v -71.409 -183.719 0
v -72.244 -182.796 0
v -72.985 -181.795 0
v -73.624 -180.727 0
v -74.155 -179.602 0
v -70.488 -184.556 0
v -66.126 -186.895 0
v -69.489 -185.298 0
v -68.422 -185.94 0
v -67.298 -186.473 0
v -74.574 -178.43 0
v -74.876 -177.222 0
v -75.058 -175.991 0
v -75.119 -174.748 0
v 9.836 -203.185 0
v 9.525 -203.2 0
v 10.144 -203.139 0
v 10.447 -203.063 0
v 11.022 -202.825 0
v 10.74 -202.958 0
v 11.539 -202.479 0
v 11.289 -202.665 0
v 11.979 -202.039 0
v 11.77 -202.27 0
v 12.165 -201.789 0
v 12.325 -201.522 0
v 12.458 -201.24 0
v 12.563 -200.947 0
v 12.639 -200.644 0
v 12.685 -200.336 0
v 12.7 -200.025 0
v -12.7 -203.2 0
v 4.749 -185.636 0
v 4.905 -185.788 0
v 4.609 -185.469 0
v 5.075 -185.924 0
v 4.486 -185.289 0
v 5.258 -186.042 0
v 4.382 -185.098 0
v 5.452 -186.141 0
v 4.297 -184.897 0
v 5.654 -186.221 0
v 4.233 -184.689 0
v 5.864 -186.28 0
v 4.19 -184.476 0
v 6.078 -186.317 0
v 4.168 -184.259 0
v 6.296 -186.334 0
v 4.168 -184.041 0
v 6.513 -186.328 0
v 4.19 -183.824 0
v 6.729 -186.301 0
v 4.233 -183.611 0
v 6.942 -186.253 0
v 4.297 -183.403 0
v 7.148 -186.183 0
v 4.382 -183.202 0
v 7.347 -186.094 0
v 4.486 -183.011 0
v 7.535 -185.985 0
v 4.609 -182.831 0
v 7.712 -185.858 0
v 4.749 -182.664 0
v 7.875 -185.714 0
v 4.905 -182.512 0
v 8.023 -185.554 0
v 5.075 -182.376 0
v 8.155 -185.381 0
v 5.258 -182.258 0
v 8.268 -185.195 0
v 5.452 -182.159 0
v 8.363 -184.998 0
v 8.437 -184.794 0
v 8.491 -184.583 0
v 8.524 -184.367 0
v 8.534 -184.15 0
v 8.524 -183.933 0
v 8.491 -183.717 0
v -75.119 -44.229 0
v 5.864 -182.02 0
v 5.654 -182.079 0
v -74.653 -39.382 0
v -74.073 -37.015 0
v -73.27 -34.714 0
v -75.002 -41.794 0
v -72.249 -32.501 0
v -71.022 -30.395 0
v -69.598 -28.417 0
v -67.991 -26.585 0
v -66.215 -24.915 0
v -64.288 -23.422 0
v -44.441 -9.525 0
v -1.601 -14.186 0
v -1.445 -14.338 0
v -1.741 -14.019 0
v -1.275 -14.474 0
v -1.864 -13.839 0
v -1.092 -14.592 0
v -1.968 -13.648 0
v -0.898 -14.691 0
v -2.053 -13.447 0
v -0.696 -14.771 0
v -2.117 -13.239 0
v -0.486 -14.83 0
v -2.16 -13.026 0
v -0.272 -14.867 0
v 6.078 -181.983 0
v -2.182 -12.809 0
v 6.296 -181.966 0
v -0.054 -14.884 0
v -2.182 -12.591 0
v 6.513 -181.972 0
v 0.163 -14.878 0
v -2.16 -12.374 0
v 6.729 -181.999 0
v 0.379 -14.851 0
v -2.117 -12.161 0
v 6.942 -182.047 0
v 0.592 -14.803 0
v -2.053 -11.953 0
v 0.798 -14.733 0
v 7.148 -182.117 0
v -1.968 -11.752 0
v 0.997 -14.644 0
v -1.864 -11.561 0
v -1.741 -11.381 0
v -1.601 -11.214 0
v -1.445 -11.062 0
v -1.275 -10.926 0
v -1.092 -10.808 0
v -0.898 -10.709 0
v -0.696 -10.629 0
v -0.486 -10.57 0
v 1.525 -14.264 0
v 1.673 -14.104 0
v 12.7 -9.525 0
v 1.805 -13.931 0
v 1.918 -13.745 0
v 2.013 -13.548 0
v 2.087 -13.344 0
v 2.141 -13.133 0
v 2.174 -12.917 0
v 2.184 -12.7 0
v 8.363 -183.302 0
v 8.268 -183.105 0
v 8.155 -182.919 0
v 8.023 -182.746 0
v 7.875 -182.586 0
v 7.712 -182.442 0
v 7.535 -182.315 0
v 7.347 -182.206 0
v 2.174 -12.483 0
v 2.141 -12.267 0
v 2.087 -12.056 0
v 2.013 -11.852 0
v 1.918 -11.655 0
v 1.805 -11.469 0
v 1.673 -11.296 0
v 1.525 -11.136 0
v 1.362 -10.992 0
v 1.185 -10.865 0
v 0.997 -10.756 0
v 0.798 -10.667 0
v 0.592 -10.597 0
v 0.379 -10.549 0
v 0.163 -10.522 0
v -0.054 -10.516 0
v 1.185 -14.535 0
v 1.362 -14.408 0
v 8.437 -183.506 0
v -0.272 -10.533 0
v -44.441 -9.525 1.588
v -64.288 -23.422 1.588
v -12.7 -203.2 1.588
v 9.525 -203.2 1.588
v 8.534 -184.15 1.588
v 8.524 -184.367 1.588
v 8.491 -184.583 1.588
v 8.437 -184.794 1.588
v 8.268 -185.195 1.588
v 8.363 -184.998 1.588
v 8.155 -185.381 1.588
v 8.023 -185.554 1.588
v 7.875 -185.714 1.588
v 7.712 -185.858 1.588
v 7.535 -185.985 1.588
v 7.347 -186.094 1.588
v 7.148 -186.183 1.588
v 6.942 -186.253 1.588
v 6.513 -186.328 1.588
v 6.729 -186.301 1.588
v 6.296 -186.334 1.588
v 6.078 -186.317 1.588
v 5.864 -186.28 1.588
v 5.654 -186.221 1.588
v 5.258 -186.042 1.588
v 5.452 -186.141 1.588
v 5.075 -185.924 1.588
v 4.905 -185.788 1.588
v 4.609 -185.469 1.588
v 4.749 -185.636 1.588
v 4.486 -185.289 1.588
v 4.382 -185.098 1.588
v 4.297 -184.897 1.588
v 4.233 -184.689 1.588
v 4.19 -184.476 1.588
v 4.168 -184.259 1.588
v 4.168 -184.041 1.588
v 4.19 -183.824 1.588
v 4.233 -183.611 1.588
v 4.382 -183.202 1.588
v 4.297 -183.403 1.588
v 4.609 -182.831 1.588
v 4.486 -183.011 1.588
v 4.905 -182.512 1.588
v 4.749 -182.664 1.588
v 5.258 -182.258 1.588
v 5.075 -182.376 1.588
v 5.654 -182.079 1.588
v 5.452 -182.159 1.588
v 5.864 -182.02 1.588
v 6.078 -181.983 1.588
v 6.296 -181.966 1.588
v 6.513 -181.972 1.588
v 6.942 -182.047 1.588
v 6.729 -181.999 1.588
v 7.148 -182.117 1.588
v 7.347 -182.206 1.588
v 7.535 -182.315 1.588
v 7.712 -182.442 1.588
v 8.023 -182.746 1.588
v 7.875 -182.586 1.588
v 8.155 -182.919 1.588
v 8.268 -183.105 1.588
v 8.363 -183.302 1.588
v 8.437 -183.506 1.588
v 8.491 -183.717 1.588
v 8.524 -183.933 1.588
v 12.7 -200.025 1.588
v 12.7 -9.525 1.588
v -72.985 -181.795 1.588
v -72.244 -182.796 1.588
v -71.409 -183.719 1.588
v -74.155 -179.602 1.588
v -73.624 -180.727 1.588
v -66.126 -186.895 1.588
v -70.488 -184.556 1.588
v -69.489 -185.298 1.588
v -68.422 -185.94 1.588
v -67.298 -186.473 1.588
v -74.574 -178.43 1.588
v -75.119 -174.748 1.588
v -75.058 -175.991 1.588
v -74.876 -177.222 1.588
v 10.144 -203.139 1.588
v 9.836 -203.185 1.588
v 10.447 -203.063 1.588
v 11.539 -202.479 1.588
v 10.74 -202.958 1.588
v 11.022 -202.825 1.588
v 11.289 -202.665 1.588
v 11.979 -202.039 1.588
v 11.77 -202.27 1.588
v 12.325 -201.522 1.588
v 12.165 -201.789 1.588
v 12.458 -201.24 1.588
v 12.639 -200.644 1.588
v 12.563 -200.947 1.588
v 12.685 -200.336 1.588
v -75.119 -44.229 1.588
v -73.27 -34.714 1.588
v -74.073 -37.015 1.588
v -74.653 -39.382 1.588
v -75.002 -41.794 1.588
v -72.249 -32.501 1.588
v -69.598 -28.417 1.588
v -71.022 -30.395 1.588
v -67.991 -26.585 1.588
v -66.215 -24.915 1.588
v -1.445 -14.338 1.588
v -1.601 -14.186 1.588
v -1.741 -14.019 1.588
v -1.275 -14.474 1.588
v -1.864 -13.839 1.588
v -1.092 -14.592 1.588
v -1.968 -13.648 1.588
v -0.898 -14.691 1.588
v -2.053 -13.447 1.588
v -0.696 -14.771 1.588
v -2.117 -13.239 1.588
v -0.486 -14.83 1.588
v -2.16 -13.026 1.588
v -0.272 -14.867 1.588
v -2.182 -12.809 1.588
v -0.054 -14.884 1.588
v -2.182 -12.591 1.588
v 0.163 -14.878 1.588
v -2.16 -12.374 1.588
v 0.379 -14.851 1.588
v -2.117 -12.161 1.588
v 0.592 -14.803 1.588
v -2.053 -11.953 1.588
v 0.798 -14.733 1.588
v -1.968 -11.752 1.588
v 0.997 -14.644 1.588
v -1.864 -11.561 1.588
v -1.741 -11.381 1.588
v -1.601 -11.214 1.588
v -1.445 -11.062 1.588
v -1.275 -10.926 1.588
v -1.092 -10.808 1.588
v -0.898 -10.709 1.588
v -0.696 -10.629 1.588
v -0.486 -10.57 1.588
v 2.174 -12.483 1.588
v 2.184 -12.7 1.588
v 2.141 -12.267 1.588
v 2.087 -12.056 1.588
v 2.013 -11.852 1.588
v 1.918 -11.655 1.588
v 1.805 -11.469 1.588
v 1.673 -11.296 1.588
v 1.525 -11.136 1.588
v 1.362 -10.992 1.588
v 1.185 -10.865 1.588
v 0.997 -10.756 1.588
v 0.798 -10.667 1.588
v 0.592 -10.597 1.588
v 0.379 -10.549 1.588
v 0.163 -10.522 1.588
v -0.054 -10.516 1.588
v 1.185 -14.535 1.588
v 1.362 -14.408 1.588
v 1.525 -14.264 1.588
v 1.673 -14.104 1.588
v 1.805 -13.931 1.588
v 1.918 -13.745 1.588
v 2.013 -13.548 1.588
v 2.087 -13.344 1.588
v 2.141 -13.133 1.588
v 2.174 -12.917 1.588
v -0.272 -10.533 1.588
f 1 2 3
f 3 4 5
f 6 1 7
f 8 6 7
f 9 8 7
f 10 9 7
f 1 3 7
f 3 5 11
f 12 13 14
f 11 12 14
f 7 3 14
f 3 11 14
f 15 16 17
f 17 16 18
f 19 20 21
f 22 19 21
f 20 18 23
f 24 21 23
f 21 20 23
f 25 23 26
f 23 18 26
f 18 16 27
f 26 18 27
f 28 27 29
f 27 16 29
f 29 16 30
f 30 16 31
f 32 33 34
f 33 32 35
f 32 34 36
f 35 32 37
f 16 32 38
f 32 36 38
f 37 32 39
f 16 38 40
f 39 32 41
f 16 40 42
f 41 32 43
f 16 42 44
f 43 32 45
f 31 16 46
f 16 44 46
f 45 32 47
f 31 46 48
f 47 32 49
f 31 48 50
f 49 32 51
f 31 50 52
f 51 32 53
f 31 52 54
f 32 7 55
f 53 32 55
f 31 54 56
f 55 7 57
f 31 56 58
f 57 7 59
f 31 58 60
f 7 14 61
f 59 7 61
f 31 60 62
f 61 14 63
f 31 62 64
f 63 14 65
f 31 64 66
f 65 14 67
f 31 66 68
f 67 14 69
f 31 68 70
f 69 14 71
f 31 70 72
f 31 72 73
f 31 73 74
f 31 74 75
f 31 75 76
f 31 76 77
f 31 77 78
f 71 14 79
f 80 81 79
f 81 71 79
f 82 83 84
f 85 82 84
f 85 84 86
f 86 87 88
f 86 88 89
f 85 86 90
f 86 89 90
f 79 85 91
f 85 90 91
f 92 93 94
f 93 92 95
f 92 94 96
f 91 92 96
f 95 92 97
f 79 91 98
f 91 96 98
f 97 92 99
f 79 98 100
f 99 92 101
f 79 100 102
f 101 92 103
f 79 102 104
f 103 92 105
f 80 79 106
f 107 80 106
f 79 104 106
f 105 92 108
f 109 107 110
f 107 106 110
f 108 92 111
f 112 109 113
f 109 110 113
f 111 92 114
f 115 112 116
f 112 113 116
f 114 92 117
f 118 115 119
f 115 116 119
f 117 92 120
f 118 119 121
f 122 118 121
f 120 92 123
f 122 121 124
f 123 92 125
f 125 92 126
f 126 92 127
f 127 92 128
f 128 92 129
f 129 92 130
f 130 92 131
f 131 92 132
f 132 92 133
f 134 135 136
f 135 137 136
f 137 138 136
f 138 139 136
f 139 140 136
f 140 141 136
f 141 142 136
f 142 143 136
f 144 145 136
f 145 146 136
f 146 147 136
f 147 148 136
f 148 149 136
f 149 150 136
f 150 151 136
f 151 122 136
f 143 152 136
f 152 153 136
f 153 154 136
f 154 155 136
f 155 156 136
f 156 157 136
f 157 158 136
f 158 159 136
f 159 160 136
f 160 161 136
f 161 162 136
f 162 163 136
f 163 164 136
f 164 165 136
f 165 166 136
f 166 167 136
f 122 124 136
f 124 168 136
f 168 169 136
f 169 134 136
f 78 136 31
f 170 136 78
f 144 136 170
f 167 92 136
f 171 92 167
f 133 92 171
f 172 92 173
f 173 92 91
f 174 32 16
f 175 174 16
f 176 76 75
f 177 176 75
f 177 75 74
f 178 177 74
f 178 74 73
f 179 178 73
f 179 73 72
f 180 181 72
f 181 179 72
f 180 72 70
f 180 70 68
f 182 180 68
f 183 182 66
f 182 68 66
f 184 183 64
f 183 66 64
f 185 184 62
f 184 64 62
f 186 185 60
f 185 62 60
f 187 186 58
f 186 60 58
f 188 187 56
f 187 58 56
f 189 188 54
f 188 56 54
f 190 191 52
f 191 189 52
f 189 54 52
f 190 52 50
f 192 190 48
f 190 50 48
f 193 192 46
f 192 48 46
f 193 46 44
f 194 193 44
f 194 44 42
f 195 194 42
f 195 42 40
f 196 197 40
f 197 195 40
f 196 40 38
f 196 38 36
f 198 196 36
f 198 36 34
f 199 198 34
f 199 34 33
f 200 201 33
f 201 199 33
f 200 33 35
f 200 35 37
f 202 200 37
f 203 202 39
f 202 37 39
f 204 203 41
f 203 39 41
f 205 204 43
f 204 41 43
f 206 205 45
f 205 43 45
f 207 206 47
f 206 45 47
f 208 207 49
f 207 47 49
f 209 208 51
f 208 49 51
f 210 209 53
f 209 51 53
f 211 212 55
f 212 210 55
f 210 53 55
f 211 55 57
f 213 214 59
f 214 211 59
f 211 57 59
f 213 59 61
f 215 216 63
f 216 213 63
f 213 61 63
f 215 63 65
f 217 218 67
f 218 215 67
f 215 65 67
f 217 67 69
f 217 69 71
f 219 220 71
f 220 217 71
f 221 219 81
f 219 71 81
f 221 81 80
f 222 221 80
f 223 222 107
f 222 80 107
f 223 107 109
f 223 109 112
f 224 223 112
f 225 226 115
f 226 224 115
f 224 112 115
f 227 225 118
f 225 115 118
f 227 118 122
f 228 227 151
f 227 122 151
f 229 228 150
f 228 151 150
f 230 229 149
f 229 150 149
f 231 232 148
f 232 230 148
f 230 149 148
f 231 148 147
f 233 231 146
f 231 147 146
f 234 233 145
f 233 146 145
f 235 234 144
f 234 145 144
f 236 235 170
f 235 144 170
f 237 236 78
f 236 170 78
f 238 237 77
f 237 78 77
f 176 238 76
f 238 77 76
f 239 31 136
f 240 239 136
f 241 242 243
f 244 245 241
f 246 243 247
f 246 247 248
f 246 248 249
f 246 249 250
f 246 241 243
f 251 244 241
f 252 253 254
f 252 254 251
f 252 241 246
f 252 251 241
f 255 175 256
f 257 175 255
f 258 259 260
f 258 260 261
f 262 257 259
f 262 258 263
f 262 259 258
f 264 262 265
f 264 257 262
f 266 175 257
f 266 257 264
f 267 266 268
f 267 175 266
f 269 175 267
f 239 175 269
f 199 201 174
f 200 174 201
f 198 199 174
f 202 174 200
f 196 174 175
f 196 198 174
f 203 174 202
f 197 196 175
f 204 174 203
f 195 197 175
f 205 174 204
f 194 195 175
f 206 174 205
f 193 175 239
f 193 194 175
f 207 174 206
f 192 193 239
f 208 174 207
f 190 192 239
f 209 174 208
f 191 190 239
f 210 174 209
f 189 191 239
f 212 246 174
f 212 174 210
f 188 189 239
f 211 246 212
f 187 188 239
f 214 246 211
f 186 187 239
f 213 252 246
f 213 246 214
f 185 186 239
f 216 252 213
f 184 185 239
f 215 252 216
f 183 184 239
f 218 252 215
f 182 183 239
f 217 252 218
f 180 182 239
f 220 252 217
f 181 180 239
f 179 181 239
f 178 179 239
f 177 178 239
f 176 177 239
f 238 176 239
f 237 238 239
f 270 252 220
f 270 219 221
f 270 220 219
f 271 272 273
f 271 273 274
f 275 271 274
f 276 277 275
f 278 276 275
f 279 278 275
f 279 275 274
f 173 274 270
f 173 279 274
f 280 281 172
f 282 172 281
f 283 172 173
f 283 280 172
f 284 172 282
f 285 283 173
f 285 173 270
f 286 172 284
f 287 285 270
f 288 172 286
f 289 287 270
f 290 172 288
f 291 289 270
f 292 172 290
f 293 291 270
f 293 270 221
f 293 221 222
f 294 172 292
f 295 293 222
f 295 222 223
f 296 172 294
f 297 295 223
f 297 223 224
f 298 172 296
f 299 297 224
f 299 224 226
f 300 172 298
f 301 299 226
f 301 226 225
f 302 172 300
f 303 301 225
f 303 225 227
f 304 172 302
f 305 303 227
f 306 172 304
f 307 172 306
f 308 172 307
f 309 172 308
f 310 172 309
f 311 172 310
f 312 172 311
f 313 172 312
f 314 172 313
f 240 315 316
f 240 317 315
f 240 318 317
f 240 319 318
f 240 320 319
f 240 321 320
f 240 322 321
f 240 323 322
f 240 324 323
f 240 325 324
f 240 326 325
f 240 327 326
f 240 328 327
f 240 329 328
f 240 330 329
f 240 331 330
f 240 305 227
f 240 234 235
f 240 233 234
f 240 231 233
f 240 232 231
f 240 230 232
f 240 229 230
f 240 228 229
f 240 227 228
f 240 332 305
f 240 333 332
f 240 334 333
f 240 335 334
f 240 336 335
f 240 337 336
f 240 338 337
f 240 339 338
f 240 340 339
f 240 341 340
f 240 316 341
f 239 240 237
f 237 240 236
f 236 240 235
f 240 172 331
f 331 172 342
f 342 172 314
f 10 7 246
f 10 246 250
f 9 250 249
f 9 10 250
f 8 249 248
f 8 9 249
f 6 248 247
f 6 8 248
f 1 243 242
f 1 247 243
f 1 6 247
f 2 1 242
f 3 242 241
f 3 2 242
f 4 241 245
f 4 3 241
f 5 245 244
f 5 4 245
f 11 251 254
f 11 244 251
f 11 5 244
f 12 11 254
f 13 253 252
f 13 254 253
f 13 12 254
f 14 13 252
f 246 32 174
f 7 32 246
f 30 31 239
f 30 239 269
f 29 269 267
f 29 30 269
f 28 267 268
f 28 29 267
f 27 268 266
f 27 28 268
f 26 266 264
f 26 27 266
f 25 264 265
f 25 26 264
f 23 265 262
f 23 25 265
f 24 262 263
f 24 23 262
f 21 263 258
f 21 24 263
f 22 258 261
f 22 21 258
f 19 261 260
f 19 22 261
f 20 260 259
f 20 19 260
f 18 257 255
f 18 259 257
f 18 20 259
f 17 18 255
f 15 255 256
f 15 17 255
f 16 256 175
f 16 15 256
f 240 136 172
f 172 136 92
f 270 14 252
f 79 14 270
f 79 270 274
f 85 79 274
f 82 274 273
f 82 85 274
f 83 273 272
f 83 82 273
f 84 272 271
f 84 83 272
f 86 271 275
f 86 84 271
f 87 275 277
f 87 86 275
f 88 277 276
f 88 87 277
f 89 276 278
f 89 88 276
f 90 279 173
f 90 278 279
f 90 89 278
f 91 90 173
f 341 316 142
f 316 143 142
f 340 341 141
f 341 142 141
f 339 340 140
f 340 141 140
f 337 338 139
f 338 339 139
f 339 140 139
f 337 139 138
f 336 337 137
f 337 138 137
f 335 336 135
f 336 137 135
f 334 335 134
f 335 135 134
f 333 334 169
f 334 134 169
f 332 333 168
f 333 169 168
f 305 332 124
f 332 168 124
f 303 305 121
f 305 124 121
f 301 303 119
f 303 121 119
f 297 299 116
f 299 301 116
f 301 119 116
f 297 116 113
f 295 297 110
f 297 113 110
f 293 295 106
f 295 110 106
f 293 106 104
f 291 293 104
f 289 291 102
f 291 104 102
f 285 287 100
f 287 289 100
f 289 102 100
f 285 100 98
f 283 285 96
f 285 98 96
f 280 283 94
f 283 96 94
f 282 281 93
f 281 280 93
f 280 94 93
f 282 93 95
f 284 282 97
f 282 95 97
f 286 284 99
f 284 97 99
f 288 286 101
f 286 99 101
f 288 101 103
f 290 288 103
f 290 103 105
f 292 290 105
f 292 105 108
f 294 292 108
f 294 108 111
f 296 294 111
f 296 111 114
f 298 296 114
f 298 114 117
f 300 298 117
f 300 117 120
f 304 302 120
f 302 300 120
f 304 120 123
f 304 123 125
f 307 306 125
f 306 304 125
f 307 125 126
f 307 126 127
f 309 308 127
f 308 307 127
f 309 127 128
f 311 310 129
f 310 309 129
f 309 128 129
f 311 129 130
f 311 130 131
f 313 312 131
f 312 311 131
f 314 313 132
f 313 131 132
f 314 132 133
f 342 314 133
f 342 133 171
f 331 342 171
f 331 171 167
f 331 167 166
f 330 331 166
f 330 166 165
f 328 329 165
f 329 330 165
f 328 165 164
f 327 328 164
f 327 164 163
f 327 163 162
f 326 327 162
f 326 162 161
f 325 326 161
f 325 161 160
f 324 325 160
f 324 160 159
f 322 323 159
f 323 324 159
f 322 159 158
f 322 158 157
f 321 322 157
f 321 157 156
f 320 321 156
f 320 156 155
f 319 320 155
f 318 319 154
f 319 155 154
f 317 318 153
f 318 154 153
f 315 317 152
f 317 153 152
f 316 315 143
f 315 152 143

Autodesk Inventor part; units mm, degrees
ref_plane "YZ Plane" through (0, 0, 0) normal (1, 0, 0) x (0, 1, 0)
ref_plane "XZ Plane" through (0, 0, 0) normal (0, 1, 0) x (-1, 0, 0)
ref_plane "XY Plane" through (0, 0, 0) normal (0, 0, 1) x (1, 0, 0)
sketch "main" plane through (0, 0, 0) normal (0, 0, 1) x (1, 0, 0)
  line L0 (38.5419, -100.052) -> (38.5419, 90.448)
  line L1 (-49.2775, -74.7747) -> (-49.2775, 55.744)
  arc A0 (-49.2775, -74.7747) -> (-40.2846, -86.9216) centre (-36.5775, -74.7747) ccw
  line L2 (13.1419, -103.227) -> (-40.2846, -86.9216)
  circle A1 centre (32.1919, -84.177) radius 2.1844
  line L3 (13.1419, -103.227) -> (35.3669, -103.227)
  arc A2 (35.3669, -103.227) -> (38.5419, -100.052) centre (35.3669, -100.052) ccw
  arc A3 (-38.4463, 76.5505) -> (-49.2775, 55.744) centre (-23.8775, 55.744) ccw
  line L4 (-18.5987, 90.448) -> (-38.4463, 76.5505)
  circle A4 centre (25.8419, 87.273) radius 2.1844
  line L5 (38.5419, 90.448) -> (-18.5987, 90.448)
  point P0 (0.4559, 3.9187)
  point P1 (-49.2775, 68.9664)
  dimension "d3" = 25.4
  dimension "d4" = 12.7
  dimension "d7" = 4.3688
sketch "Sketch1" plane through (0, 0, 0) normal (0, 0, 1) x (1, 0, 0)
  line L0 (-22.225, -9.525) -> (-22.225, -200.293)
  line L1 (12.7, -200.025) -> (12.7, -9.525)
  line L2 (-75.1194, -174.7477) -> (-75.1194, -44.2289)
  arc A0 (-75.1194, -174.7477) -> (-66.1265, -186.8946) centre (-62.4194, -174.7477) ccw
  line L3 (-12.7, -203.2) -> (-66.1265, -186.8946)
  circle A1 centre (6.35, -184.15) radius 2.1844
  line L4 (-12.7, -203.2) -> (9.525, -203.2)
  arc A2 (9.525, -203.2) -> (12.7, -200.025) centre (9.525, -200.025) ccw
  arc A3 (-64.2882, -23.4225) -> (-75.1194, -44.2289) centre (-49.7194, -44.2289) ccw
  line L5 (-44.4406, -9.525) -> (-64.2882, -23.4225)
  circle A4 centre (0, -12.7) radius 2.1844
  line L6 (12.7, -9.525) -> (-44.4406, -9.525)
  point P0 (0, 0)
extrude "Extrusion2" add sketch "Sketch1" along normal blind 1.5875
equation "\"BendRadius\" = Thickness"
equation "\"BendReliefWidth\" = Thickness"
equation "\"BendReliefDepth\" = 0.5 * Thickness"
equation "\"CornerReliefSize\" = 4 * Thickness"
equation "\"MinimumRemnant\" = 2 * Thickness"
equation "\"TransitionRadius\" = BendRadius"
equation "\"JacobiRadiusSize\" = BendRadius"
equation "\"GapSize\" = Thickness"
equation "\"Thickness\" = 1.5875"
properties part number "wing" material "Acetal Resin, White"
